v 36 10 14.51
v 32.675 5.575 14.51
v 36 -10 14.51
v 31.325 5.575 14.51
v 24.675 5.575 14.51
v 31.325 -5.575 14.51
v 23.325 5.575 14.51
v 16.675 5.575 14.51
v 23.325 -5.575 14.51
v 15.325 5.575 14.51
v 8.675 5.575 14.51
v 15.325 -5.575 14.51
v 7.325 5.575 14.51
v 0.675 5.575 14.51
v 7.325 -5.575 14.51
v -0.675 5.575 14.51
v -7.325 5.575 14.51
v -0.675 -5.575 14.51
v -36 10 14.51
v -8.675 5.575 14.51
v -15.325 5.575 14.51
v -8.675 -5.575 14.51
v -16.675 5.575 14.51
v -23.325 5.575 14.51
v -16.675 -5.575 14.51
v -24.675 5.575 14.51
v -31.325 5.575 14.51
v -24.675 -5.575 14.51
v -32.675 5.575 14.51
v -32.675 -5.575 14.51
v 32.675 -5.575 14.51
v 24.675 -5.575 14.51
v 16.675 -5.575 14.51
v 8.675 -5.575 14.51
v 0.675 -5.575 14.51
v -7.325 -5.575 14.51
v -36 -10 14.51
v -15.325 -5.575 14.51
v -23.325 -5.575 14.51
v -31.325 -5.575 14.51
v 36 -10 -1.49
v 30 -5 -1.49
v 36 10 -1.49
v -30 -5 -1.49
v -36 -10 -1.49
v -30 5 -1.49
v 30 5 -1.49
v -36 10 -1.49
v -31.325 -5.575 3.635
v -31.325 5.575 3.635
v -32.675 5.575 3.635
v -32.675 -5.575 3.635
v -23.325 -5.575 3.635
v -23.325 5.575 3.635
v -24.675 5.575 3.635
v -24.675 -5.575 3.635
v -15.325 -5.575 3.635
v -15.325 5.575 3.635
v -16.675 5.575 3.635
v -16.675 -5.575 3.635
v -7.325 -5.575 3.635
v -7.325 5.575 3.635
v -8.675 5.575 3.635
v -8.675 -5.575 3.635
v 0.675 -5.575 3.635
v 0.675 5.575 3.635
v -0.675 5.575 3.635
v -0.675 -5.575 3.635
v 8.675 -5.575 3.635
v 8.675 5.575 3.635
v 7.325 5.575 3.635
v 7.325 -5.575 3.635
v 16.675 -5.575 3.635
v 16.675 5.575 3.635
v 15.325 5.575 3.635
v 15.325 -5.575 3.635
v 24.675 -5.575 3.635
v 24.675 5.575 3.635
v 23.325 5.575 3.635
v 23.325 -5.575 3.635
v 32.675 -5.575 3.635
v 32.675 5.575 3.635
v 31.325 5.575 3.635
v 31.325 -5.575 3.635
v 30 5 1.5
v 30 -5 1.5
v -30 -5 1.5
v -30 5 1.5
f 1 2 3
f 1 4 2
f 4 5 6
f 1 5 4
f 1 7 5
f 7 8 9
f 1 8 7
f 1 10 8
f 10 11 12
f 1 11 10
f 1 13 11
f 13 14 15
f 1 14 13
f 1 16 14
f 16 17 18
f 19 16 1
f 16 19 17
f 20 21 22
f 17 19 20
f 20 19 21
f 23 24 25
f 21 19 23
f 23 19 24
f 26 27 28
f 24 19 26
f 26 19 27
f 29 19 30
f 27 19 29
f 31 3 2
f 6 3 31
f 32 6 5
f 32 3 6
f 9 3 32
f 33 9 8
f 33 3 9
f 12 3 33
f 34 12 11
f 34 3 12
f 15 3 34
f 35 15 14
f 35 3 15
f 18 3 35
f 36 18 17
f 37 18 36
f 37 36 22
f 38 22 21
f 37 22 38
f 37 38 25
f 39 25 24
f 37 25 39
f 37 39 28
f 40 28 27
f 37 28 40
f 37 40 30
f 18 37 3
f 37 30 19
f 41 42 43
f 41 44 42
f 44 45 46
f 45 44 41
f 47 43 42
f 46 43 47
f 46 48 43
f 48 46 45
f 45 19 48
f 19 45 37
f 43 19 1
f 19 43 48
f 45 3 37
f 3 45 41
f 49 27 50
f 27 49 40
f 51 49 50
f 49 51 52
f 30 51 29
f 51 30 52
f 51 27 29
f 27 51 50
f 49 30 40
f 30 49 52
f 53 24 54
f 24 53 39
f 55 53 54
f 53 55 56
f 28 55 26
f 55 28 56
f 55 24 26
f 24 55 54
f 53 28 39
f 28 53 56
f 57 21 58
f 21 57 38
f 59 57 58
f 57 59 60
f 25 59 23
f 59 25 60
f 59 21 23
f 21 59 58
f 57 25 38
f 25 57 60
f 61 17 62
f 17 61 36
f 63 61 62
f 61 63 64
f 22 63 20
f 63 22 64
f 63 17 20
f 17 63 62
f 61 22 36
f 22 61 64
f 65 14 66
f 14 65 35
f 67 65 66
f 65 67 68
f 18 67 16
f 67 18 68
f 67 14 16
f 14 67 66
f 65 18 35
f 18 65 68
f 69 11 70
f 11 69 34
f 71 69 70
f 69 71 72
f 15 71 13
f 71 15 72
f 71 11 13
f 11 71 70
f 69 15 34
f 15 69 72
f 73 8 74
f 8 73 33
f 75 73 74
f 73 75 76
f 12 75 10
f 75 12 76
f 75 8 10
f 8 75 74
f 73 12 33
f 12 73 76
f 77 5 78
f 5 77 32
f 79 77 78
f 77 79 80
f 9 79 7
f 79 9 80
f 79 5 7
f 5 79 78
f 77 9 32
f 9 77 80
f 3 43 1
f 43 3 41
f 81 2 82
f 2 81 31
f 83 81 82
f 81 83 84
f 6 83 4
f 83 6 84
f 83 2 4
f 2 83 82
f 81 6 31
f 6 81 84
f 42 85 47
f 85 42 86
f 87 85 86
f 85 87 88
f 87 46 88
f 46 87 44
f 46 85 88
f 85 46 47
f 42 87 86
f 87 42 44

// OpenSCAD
$fn=60;
slop=0.25;
units=8;
count=8;

module micro_sd_card_array(units, count, slop, center=false) {
    module a() {
        for(i=[0:units:count*units]) {
            translate([i,0,0]) {
                difference() {
                    color(c=[0.5,0.61,0.1,0.5]) cube([units,units*2+units/2,units*2],center=true);
                    translate([0,0,units-(3+slop)]) cube([1.1+slop,11+slop-0.1,15+slop],center=true);
                }
            }
        }
    }
    if(center) {
        cx=(units*count)/2;
        translate([-cx,0,0]) a();
    } else {
        translate([units-(units/2),units+(units/4),units]) a();
    }
}

difference() {
    translate([0,0,units-1.49]) micro_sd_card_array(units, count, slop, center=true);
    cube([60,10,3],center=true);
}
